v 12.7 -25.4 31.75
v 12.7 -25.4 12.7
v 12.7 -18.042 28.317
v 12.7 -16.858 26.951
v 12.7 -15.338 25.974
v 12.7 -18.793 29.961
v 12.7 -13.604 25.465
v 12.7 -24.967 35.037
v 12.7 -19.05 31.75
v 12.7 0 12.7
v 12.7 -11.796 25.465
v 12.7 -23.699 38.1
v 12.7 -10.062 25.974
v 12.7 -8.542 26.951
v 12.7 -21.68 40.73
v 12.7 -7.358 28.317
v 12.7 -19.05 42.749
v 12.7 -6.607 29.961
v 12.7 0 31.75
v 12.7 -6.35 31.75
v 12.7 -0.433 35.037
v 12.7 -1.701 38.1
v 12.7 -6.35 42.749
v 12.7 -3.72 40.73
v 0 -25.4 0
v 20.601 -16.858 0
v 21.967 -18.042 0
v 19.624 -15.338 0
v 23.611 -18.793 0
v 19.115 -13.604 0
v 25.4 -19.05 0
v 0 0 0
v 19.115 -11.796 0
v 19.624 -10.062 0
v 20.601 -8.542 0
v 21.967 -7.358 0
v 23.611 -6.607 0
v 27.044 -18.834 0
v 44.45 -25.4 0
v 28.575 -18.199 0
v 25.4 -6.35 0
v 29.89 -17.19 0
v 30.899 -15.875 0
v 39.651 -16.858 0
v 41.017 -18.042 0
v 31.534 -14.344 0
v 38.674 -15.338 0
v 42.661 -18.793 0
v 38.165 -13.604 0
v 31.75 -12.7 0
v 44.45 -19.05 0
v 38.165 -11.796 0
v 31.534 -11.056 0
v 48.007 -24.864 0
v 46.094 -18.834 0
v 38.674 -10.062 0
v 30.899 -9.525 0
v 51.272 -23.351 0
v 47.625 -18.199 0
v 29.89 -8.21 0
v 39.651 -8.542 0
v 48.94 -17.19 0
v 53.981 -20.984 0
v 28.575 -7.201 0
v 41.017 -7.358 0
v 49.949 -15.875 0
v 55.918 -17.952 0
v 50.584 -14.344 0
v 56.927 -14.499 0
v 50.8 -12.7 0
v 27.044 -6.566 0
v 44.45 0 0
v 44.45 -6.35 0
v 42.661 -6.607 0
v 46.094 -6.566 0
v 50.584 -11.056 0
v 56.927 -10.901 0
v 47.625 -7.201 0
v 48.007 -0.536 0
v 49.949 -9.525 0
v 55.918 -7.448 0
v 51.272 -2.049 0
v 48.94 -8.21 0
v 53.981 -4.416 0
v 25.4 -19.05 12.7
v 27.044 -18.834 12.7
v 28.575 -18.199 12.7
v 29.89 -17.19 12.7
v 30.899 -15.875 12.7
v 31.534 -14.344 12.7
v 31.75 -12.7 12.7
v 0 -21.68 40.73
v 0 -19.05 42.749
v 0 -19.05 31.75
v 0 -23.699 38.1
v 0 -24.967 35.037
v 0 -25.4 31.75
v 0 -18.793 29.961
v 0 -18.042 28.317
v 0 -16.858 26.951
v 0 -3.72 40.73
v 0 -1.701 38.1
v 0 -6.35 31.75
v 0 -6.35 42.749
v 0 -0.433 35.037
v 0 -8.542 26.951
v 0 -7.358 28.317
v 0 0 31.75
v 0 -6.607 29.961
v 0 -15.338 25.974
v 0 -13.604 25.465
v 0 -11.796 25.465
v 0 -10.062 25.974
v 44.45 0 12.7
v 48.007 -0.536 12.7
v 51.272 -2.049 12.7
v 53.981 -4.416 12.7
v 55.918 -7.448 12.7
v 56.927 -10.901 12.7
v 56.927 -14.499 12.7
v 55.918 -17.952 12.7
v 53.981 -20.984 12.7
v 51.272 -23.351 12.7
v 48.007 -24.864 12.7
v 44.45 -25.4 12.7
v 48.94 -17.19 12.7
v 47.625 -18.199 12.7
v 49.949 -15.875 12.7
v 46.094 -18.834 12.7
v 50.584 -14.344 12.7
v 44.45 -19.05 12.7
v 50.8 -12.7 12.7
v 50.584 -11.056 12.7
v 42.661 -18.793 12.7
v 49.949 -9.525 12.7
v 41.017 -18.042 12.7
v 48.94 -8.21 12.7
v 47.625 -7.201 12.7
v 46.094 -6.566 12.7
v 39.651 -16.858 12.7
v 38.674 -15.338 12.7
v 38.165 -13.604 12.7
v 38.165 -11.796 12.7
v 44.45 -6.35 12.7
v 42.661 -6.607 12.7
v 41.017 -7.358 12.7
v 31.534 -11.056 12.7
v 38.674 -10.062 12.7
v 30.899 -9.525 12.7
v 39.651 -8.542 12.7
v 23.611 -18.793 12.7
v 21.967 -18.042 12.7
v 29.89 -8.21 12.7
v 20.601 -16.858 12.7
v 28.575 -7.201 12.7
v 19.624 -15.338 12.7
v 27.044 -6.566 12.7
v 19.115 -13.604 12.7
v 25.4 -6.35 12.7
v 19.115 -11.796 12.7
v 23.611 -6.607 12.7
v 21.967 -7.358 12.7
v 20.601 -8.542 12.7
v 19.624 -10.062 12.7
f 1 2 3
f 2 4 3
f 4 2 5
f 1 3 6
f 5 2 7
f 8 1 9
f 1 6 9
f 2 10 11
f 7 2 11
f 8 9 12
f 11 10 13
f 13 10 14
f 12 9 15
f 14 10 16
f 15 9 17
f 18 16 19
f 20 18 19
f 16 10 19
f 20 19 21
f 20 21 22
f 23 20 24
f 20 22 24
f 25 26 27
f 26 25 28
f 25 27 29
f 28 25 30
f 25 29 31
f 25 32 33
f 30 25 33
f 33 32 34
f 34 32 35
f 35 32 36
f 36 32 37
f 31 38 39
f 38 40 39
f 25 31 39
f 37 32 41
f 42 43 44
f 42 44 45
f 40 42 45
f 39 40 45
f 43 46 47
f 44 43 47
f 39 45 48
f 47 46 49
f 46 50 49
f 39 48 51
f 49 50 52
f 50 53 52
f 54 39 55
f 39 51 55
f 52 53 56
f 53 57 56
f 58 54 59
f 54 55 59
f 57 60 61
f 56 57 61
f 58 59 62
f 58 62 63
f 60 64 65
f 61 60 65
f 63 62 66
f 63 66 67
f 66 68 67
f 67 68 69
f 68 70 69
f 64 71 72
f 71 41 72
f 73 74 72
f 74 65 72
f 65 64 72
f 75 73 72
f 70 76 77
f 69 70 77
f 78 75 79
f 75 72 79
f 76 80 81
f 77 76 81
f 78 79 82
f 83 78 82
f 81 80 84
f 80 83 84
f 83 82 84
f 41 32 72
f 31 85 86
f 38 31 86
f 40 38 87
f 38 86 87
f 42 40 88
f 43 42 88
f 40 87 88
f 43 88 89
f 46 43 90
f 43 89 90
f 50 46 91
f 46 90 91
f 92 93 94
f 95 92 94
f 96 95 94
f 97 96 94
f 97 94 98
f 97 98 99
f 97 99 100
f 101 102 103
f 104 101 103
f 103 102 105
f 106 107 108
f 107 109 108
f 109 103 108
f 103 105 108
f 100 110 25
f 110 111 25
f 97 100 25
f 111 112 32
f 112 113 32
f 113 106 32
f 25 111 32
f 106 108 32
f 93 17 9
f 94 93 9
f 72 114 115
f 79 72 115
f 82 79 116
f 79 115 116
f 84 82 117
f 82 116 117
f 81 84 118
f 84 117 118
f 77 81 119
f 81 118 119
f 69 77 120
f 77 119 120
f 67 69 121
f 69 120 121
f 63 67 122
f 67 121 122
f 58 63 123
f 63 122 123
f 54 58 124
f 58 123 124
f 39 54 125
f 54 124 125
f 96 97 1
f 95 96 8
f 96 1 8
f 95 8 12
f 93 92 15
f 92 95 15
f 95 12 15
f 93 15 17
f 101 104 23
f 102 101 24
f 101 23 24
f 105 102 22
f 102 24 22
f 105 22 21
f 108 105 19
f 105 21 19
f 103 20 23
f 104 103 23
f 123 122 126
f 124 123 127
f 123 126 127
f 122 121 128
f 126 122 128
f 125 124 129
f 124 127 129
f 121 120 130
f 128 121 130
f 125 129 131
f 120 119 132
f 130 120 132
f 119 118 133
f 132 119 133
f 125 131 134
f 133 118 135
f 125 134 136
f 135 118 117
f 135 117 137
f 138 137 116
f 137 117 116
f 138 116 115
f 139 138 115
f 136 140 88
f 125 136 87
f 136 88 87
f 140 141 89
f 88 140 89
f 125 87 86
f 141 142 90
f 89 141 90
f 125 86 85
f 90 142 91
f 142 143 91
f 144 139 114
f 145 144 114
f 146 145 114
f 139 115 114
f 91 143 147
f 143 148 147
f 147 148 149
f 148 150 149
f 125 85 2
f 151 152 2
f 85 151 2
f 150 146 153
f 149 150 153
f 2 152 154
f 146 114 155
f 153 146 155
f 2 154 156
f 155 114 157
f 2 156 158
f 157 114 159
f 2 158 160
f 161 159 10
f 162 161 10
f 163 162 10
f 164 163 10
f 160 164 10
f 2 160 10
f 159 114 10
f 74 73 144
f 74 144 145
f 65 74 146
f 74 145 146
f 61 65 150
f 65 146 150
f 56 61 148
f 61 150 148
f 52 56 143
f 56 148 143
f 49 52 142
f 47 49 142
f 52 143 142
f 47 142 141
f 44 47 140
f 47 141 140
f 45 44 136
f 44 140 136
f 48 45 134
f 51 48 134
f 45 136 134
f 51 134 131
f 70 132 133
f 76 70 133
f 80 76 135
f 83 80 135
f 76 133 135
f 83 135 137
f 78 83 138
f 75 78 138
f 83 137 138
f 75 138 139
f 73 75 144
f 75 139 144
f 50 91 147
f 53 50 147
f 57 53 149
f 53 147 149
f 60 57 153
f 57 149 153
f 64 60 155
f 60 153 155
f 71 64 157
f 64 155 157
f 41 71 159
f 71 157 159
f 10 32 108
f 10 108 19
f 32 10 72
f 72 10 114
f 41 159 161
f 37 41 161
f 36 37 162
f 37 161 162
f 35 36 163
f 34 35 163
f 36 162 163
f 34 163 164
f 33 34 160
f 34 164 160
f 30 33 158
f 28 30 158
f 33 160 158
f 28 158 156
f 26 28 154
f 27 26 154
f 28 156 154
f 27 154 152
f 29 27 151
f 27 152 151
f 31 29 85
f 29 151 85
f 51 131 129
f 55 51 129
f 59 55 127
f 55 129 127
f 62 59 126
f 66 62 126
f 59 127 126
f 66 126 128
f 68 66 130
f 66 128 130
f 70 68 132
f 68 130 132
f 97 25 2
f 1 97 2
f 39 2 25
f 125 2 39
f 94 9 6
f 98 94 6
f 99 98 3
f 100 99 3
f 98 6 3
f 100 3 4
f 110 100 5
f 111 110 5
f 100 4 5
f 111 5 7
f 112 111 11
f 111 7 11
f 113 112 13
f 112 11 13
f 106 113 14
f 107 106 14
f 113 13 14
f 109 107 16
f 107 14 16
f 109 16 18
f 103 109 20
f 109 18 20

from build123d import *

# Parameters (mm, degrees)
F1_DEPTH = 25.4
F3_DEPTH = 12.701
F5_DEPTH = 12.701


with BuildPart() as f1:
    # F0 (on Front) → F1 (new body)
    with BuildSketch(Plane.XZ):
        Polygon((0, 44.45), (0, 0), (57.15, 0), (57.15, 12.7), (12.7, 12.7), (12.7, 44.45), align=None)
    extrude(amount=F1_DEPTH)

    # F2 (on face) → F3 (cut, through all)
    with BuildSketch(Plane.XY.offset(12.7)):
        with BuildLine():
            Line((25.4, -19.05), (25.4, -6.35))
            ThreePointArc((25.4, -6.35), (19.05, -12.7), (25.4, -19.05))
        make_face()
        with BuildLine():
            ThreePointArc((31.75, -12.7), (29.8901280605, -8.2098719395), (25.4, -6.35))
            Line((25.4, -6.35), (25.4, -19.05))
            ThreePointArc((25.4, -19.05), (29.8901280605, -17.1901280605), (31.75, -12.7))
        make_face()
        with BuildLine():
            Line((44.45, -19.05), (44.45, -6.35))
            ThreePointArc((44.45, -6.35), (38.1, -12.7), (44.45, -19.05))
        make_face()
        with BuildLine():
            ThreePointArc((50.8, -12.7), (48.9401280605, -8.2098719395), (44.45, -6.35))
            Line((44.45, -6.35), (44.45, -19.05))
            ThreePointArc((44.45, -19.05), (48.9401280605, -17.1901280605), (50.8, -12.7))
        make_face()
        with BuildLine():
            Line((57.15, 0), (44.45, 0))
            ThreePointArc((44.45, 0), (57.0547872188, -12.7), (44.45, -25.4))
            Line((44.45, -25.4), (57.15, -25.4))
            Line((57.15, -25.4), (57.15, 0))
        make_face()
    extrude(amount=-F3_DEPTH, mode=Mode.SUBTRACT)

    # F4 (on face) → F5 (cut, through all)
    with BuildSketch(Plane.YZ.offset(12.7)):
        with BuildLine():
            Line((-25.4, 44.45), (-25.4, 31.75))
            ThreePointArc((-25.4, 31.75), (-23.6985226281, 38.1), (-19.05, 42.7485226281))
            Line((-19.05, 42.7485226281), (-19.05, 44.45))
            Line((-19.05, 44.45), (-25.4, 44.45))
        make_face()
        with BuildLine():
            ThreePointArc((-6.35, 42.7485226281), (-1.7014773719, 38.1), (0, 31.75))
            Line((0, 31.75), (0, 44.45))
            Line((0, 44.45), (-6.35, 44.45))
            Line((-6.35, 44.45), (-6.35, 42.7485226281))
        make_face()
        with BuildLine():
            ThreePointArc((-19.05, 31.75), (-12.7, 25.4), (-6.35, 31.75))
            Line((-6.35, 31.75), (-19.05, 31.75))
        make_face()
        with BuildLine():
            Line((-19.05, 31.75), (-6.35, 31.75))
            ThreePointArc((-6.35, 31.75), (-12.7, 38.1), (-19.05, 31.75))
        make_face()
        with BuildLine():
            ThreePointArc((-19.05, 31.75), (-12.7, 38.1), (-6.35, 31.75))
            Line((-6.35, 31.75), (-6.35, 42.7485226281))
            ThreePointArc((-6.35, 42.7485226281), (-9.4129981272, 44.0172579939), (-12.7, 44.45))
            ThreePointArc((-12.7, 44.45), (-15.9870018728, 44.0172579939), (-19.05, 42.7485226281))
            Line((-19.05, 42.7485226281), (-19.05, 31.75))
        make_face()
        with BuildLine():
            ThreePointArc((-12.7, 44.45), (-9.4129981272, 44.0172579939), (-6.35, 42.7485226281))
            Line((-6.35, 42.7485226281), (-6.35, 44.45))
            Line((-6.35, 44.45), (-12.7, 44.45))
        make_face()
        with BuildLine():
            Line((-19.05, 44.45), (-19.05, 42.7485226281))
            ThreePointArc((-19.05, 42.7485226281), (-15.9870018728, 44.0172579939), (-12.7, 44.45))
            Line((-12.7, 44.45), (-19.05, 44.45))
        make_face()
    extrude(amount=-F5_DEPTH, mode=Mode.SUBTRACT)


solid = f1.part
